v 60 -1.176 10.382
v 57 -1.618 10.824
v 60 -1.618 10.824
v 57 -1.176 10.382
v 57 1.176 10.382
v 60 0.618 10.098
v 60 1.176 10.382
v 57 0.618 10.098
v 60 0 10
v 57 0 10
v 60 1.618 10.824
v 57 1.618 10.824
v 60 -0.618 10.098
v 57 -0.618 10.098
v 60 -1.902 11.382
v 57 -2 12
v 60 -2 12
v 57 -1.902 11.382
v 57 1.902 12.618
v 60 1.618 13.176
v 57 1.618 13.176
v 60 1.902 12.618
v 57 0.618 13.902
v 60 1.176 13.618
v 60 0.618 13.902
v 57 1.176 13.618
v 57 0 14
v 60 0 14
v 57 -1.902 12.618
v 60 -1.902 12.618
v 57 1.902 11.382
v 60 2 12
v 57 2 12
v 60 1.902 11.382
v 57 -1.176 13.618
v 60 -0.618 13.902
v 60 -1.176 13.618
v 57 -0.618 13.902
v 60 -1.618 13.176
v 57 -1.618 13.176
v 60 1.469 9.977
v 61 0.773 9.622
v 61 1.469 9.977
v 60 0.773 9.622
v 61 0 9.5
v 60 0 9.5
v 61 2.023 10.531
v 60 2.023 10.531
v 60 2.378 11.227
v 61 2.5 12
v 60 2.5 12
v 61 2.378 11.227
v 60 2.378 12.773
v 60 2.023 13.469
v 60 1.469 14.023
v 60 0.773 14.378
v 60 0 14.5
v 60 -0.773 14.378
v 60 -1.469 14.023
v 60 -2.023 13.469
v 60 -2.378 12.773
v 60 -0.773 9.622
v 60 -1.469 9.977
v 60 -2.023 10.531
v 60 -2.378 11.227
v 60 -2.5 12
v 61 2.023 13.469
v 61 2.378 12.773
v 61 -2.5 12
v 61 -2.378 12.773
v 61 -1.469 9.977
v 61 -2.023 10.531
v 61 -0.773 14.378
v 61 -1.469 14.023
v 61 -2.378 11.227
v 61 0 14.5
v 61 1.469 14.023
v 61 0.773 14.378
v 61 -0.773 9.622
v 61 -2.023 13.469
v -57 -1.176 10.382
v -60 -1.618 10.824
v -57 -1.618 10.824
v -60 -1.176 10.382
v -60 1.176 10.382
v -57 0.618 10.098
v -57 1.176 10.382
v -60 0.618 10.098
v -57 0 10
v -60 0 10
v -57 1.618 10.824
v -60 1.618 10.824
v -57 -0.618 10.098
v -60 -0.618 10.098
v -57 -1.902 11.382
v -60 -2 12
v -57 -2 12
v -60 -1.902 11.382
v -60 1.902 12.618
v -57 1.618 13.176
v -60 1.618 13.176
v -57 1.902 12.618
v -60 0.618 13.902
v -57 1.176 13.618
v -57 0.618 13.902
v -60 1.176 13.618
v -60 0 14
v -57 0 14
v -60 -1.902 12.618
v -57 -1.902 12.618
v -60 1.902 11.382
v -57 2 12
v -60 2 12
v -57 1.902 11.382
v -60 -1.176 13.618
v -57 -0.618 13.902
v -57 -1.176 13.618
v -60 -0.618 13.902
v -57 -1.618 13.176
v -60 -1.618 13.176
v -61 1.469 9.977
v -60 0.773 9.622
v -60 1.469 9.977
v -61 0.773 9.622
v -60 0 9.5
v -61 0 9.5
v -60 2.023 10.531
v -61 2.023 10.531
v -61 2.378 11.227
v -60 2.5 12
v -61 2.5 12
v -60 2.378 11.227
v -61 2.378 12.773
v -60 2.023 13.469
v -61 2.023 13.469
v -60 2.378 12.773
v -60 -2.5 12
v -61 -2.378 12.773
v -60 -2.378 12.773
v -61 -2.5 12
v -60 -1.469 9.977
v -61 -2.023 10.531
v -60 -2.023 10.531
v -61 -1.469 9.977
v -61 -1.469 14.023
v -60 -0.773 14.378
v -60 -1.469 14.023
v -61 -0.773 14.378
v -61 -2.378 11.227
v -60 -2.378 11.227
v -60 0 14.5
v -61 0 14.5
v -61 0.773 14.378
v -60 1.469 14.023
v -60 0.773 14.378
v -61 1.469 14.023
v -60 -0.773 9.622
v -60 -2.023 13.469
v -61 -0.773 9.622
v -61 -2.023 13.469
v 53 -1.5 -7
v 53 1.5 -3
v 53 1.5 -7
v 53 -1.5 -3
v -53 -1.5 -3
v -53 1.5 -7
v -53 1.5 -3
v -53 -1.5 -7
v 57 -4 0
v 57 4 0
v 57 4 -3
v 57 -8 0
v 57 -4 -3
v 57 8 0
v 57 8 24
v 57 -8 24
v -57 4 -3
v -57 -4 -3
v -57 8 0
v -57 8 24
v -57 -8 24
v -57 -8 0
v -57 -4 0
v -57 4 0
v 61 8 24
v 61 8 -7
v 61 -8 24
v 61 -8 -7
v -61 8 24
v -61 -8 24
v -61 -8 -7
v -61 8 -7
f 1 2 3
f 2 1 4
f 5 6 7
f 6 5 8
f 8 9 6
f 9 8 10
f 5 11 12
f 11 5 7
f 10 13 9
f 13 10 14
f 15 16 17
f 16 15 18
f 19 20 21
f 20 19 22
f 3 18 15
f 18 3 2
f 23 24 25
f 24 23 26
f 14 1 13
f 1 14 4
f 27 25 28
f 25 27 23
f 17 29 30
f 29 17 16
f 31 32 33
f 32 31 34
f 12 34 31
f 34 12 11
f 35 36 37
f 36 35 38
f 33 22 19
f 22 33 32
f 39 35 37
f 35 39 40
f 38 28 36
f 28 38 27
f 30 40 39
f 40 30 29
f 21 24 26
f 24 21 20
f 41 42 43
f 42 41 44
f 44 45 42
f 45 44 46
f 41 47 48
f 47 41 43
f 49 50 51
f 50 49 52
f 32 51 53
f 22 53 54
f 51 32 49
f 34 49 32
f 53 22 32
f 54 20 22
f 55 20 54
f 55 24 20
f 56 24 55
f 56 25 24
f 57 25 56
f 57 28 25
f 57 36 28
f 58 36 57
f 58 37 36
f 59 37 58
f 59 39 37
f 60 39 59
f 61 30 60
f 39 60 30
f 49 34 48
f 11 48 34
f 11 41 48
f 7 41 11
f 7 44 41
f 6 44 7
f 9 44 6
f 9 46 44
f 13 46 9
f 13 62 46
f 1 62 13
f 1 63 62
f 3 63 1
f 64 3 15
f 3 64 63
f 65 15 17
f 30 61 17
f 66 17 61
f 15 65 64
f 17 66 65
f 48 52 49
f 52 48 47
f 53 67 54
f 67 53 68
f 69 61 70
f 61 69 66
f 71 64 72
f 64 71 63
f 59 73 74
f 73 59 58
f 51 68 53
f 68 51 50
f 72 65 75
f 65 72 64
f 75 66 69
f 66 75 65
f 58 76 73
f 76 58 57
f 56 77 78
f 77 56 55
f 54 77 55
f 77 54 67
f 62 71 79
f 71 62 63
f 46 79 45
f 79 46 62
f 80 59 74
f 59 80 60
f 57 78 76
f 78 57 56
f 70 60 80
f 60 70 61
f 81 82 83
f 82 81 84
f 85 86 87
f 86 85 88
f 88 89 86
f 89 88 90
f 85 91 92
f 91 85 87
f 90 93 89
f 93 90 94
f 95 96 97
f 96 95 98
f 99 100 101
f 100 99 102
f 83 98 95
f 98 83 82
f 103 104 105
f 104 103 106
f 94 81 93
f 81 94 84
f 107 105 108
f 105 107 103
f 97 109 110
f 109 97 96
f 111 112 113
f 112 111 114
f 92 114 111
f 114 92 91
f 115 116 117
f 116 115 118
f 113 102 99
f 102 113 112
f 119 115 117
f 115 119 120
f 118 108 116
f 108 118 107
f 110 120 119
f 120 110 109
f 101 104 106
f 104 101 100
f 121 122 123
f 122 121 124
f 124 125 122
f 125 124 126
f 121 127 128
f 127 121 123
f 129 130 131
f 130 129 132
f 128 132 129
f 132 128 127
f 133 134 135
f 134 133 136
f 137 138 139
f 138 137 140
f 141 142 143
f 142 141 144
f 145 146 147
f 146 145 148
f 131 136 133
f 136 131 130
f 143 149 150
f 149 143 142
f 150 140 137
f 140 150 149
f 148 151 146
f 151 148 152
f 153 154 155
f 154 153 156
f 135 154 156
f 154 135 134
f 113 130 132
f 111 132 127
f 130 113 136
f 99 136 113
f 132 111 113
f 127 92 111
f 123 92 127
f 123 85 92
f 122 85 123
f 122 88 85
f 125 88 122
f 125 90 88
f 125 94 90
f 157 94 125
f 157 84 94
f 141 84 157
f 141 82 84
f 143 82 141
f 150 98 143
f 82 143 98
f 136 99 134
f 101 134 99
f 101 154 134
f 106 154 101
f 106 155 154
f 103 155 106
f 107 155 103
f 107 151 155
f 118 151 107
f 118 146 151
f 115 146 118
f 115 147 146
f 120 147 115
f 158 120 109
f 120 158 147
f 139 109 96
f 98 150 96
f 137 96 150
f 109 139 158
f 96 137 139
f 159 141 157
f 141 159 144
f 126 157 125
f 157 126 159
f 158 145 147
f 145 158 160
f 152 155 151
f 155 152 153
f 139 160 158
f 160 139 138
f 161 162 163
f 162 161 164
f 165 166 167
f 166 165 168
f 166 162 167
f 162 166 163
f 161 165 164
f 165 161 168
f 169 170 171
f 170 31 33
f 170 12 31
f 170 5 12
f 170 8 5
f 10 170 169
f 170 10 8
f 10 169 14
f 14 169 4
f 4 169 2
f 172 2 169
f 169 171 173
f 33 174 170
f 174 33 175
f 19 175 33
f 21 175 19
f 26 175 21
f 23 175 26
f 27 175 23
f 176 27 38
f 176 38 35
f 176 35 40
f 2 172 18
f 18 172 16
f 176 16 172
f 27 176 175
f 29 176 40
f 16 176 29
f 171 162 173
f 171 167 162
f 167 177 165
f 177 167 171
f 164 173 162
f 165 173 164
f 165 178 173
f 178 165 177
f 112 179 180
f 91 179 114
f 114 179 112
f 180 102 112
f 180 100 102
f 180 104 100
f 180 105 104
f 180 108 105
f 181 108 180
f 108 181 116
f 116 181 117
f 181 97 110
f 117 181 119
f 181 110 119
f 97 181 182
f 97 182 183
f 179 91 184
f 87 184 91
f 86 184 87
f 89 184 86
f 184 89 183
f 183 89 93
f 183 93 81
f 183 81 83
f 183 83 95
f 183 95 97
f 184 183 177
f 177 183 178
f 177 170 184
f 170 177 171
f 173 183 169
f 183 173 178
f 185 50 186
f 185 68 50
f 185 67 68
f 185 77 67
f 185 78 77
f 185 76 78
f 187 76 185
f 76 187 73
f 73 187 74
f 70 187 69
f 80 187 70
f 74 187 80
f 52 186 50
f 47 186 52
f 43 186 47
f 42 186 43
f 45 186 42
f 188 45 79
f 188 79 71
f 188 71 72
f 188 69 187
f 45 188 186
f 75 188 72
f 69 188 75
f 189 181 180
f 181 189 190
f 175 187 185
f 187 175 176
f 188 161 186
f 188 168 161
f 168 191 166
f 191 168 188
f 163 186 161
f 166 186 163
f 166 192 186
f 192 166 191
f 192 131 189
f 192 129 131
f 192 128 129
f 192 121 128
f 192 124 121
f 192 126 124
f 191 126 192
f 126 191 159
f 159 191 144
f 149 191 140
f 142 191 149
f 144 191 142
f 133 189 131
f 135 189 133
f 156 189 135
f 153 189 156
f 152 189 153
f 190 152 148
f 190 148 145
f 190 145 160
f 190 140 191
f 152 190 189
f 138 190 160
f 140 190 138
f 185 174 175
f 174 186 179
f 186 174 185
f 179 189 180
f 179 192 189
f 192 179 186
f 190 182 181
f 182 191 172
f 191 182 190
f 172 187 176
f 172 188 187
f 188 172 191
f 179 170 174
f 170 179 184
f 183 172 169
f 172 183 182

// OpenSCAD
// file: ../../parts/switch.scad
/*
    SWITCH
*/

switch_x = 19.8;
switch_y = 11.5;
switch_y_total = 15.3;
switch_z = 6.4;
switch_diameter = 2; // 2.5

module switch() {
	
	//difference() {
		
		union() {
				
			translate([0, (switch_y / 2) - 2.9, 0])
			cube([switch_x, switch_y, switch_z], center = true);
			
			switch_pin_y = switch_y_total - switch_y;
			color([0, 1, 0, 0.7])
			translate([0, -(switch_pin_y / 2) - 2.9 + 0.01, 0])
			cube([switch_x, switch_pin_y, switch_z], center = true);
		}
		
		color([1, 0, 0, 0.7])
		union() {
			translate([-9.5 / 2, 0, 0])
			cylinder (r=(switch_diameter / 2), h=20 , center=true);
			translate([ 9.5 / 2, 0, 0])
			cylinder (r=(switch_diameter / 2), h=20 , center=true);
		}
	//}
}
// ss-5gl
// file: ../../XYZ/config.scad
include <../parts/switch.scad>


rod_side = 16;
rod_length = 700;

rod_horizontal_spacing	= 120; // center to center / min 105
rod_vertical_spacing	= 2;

bearing_outer_diameter = 10;
bearing_inner_diameter = 3;
bearing_height = 4;

    // avoid touching this except if you know what's you're doing
    
bearing_holder_spacing_1 = 0.7; // space between bearing flat sides and piece
bearing_holder_spacing_2 = 1; // space between bearing perimeter and piece
bearing_holder_width = 3; // thickness of pieces holding the bearings
bearing_screw_access_size = 10; // the size of the cube to remove to be able to put in place the bearing screw

screw_exceed = 3; // how much you want a screew can exceed in length
    // default M3 screws size
screw_diameter = 3; // the diameter of your screws
    // default M3 nuts size
screws_nuts_side_min = 5.75; // 5.4min
screws_nuts_side_max = 6.55; // default is 6mm but we add some margin
screw_nuts_height = 3; // default is 2.4mm
screws_material_holder_min_size = 3; // the minimum of material arround a screw
screws_attach_length = 10; // the min length of the screew which will attach the 2 pieces

rod_holder_size = 10; // the length of material which will tighten the cariage rods

rod_piece_spacing = 1; // space between rod and piece
   
pieces_spacing = 1; // the space between the 2 pieces

motor_holder_thickness = 4; // thickness of motor support


/*
    Computed variables for future use
*/

rod_remove_side = rod_side + (rod_piece_spacing * 2);

    // represent the min size of material which should warp a screw
screw_virtual_holder_side = screw_diameter + (screws_material_holder_min_size * 2);

	// represent the area taken by bearings
bearing_virtual_cube_side = (((rod_side / 2) + bearing_outer_diameter + (bearing_height / 2) + bearing_holder_spacing_1 + bearing_holder_width) / sqrt(2)) * 2;

    // the outers screews could touch the rod, so we need to compute an offset
space_rod_outer = (bearing_virtual_cube_side - (rod_remove_side * sqrt(2))) / 2; // the minimum must be screw_virtual_holder_side
echo("space_rod_outer", space_rod_outer);
outer_screw_offset = abs(screw_virtual_holder_side - space_rod_outer);

	// base piece size
base_block_x = rod_horizontal_spacing + (rod_side * sqrt(2)) + (screw_virtual_holder_side * 2);  
base_block_y = bearing_virtual_cube_side + rod_holder_size /*+ screw_virtual_holder_side*/ + outer_screw_offset;
base_block_z = max(bearing_virtual_cube_side, rod_remove_side * sqrt(2) + motor_holder_thickness * 2);


 base_block_remove_x = rod_horizontal_spacing - (rod_side * sqrt(2)) - (screw_virtual_holder_side * 2);
base_block_remove_y = base_block_y;
base_block_remove_z = max(rod_remove_side * sqrt(2), base_block_z - (motor_holder_thickness * 2));



/*
    RODS
*/

module rod(show_rods) {
    if(show_rods) {
        color([0.7, 0.7, 0.7])
        rotate([45, 0, 0])
        cube([rod_length, rod_side, rod_side], center = true);
    }
}
// draw a rod


module screw() {
    screw_height = 50;
    cylinder (r=(screw_diameter / 2), h=screw_height , center=true);
}




module base_screw_remove_tighten() {
    
    
    color([1, 0, 0, 0.7])
    union() {
        
        screw_length = base_block_z + 1;
        
        cylinder (r=(screw_diameter / 2), h=screw_length, center=true);
    
        nuts_remove_length = (screw_length / 2) - (screws_attach_length / 2);
    
        translate([0, 0, (screw_length / 2) - (nuts_remove_length / 2)])
        cylinder ($fn = 6, r=(screws_nuts_side_max / 2), h=nuts_remove_length, center=true);
        
        translate([0, 0, -((screw_length / 2) - (nuts_remove_length / 2))])
        cylinder ($fn = 6, r=(screws_nuts_side_max / 2), h=nuts_remove_length, center=true);
    }
}
// base_screw_remove_tighten



/*
    SWITCH
*/

switch_x = 19.8;
switch_y = 11.5;
switch_y_total = 15.3;
switch_z = 6.4;
switch_diameter = 2; // 2.5

module switch() {
	
	//difference() {
		
		union() {
				
			translate([0, (switch_y / 2) - 2.9, 0])
			cube([switch_x, switch_y, switch_z], center = true);
			
			switch_pin_y = switch_y_total - switch_y;
			color([0, 1, 0, 0.7])
			translate([0, -(switch_pin_y / 2) - 2.9 + 0.01, 0])
			cube([switch_x, switch_pin_y, switch_z], center = true);
		}
		
		color([1, 0, 0, 0.7])
		union() {
			translate([-9.5 / 2, 0, 0])
			cylinder (r=(switch_diameter / 2), h=20 , center=true);
			translate([ 9.5 / 2, 0, 0])
			cylinder (r=(switch_diameter / 2), h=20 , center=true);
		}
	//}
}
// ss-5gl
// main file
$fn=20;

include <../../XYZ/config.scad>

rod_side = 20.4;
material_thickness = 4;
material_space = 0.5;

power_socket_x = 46.7 + material_space;
power_socket_y = 20;
power_socket_z = 27.3 + material_space;

power_socket_fix_margin = 1;
power_socket_fix_x_1 = 8;
power_socket_fix_x_border_1 = 3; // distance between border of part and fix 
power_socket_fix_x_2 = 5;
power_socket_fix_x_border_2 = 10;
power_socket_fix_y = 0.8;
power_socket_fix_z = 1;

power_socket_extra_border = 4;

power_socket_base_x = power_socket_x + (power_socket_extra_border * 2);
power_socket_base_y = material_thickness;
power_socket_base_z = rod_side + power_socket_z + (power_socket_extra_border * 2);

power_socket_base_y_offset = -(rod_side / 2) - (power_socket_base_y / 2);
power_socket_base_z_offset = (power_socket_base_z / 2) - (rod_side / 2);

power_socket_y_offset = (power_socket_y / 2) - (rod_side / 2) - material_thickness - 0.01;
power_socket_z_offset = (rod_side / 2) + (power_socket_z / 2) + power_socket_extra_border;

/*
    ROD FIX
*/

module positioned_rod() {
	color([0.7, 0.7, 0.7])
    cube([1000, rod_side, rod_side], center = true);
}
// positioned_rod
//positioned_rod();


module fix_screw(pos_x) {
	screw_x_offset = (power_socket_base_x / 2) - 10;
	color([1, 0, 0])
	translate([screw_x_offset * pos_x, 0, 0])
	rotate([90, 0, 0])
	screw();
}
// fix_screw

module positioned_screws() {
	fix_screw(+1);
	fix_screw(-1);
}
// positioned_screws


module power_socket_piece() {
	union() {
		color([0, 0, 0])
		cube([power_socket_x, power_socket_y, power_socket_z], center = true);
		
		
		power_socket_fix_x_offset_1 = (power_socket_x / 2) - (power_socket_fix_x_1 / 2) - power_socket_fix_x_border_1;
		
		power_socket_fix_x_offset_2 = (power_socket_x / 2) - (power_socket_fix_x_2 / 2) - power_socket_fix_x_border_2;
		
		power_socket_fix_z_offset = (power_socket_z / 2) + (power_socket_fix_z / 2); 
		
		color([1, 0, 0])
		translate([0, power_socket_fix_y, 0])
		union() {
			translate([power_socket_fix_x_offset_1, 0, power_socket_fix_z_offset - 0.01])
			cube([power_socket_fix_x_1 + (2 * power_socket_fix_margin), power_socket_y, power_socket_fix_z], center = true);
		

			translate([-power_socket_fix_x_offset_2, 0, power_socket_fix_z_offset - 0.01])
			cube([power_socket_fix_x_2 + (2 * power_socket_fix_margin), power_socket_y, power_socket_fix_z], center = true);
			
			
			translate([power_socket_fix_x_offset_1, 0, -power_socket_fix_z_offset + 0.01])
			cube([power_socket_fix_x_1 + (2 * power_socket_fix_margin), power_socket_y, power_socket_fix_z], center = true);
		

			translate([-power_socket_fix_x_offset_2, 0, -power_socket_fix_z_offset + 0.01])
			cube([power_socket_fix_x_2 + (2 * power_socket_fix_margin), power_socket_y, power_socket_fix_z], center = true);
		}
	}
}
// power_socket_piece


module power_socket_base() {
	color([0.7, 0.7, 0])
	translate([0, power_socket_base_y_offset, power_socket_base_z_offset])
	cube([power_socket_base_x, power_socket_base_y, power_socket_base_z], center = true);
}
// power_socket_base

module power_socket() {
	difference() {
		power_socket_base();
		
		translate([0, power_socket_y_offset, power_socket_z_offset])
		power_socket_piece();
		
		positioned_screws();
	}
}
// power_socket

washer_diameter = 8;
screw_m3_diameter = 3;
screw_m4_diameter = 4;

power_supply_x = 114;
power_supply_y = 215;
power_supply_z = 50;

power_supply_hole_z_offset = 12;
power_supply_screw_z_margin = 3;

power_supply_base_x = power_supply_x + (material_thickness * 2);
power_supply_base_y = 16;
power_supply_base_z = material_thickness + power_supply_screw_z_margin + (power_supply_hole_z_offset * 2);

power_supply_base_z_offset = (power_supply_base_z / 2) - material_thickness - power_supply_screw_z_margin;


module screw_m4() {
	screw_height = 50;
	cylinder (r=(screw_m4_diameter / 2), h=screw_height , center=true);
	cylinder (r=((screw_m4_diameter + 1) / 2), h=2 , center=true);
}
// screw_m4

module power_supply_piece_fix_holes() {
	translate([(power_supply_base_x / 2), 0, power_supply_hole_z_offset])
	rotate([0, 90, 0])
	screw_m4();
	
	translate([-(power_supply_base_x / 2), 0, power_supply_hole_z_offset])
	rotate([0, 90, 0])
	screw_m4();
}
// power_supply_piece_fix_holes


module power_supply_piece_fix_rod() {
	power_supply_piece_fix_rod_z = 20;
	
	union() {
		cube([(power_supply_x - washer_diameter), screw_m3_diameter, power_supply_piece_fix_rod_z], center = true);
		
		cube([power_supply_x, washer_diameter, (power_supply_screw_z_margin * 2)], center = true);
	}
}
// power_supply_piece_fix_rod

module power_supply_piece() {
	
	color([0.5, 0.5, 0.5])
	translate([0, 0, (power_supply_z / 2)])
	cube([power_supply_x, power_supply_y, power_supply_z], center = true);
}
// power_socket_piece


module power_supply_base() {
	
	color([0.7, 0.7, 0])
	translate([0, 0, power_supply_base_z_offset])
	cube([power_supply_base_x, power_supply_base_y, power_supply_base_z], center = true);
}
//power_supply_base

module power_supply() {
	difference() {
		power_supply_base();
		
		power_supply_piece();
		power_supply_piece_fix_holes();
		power_supply_piece_fix_rod();
	}
}
// power_supply


//power_socket();
power_supply();
